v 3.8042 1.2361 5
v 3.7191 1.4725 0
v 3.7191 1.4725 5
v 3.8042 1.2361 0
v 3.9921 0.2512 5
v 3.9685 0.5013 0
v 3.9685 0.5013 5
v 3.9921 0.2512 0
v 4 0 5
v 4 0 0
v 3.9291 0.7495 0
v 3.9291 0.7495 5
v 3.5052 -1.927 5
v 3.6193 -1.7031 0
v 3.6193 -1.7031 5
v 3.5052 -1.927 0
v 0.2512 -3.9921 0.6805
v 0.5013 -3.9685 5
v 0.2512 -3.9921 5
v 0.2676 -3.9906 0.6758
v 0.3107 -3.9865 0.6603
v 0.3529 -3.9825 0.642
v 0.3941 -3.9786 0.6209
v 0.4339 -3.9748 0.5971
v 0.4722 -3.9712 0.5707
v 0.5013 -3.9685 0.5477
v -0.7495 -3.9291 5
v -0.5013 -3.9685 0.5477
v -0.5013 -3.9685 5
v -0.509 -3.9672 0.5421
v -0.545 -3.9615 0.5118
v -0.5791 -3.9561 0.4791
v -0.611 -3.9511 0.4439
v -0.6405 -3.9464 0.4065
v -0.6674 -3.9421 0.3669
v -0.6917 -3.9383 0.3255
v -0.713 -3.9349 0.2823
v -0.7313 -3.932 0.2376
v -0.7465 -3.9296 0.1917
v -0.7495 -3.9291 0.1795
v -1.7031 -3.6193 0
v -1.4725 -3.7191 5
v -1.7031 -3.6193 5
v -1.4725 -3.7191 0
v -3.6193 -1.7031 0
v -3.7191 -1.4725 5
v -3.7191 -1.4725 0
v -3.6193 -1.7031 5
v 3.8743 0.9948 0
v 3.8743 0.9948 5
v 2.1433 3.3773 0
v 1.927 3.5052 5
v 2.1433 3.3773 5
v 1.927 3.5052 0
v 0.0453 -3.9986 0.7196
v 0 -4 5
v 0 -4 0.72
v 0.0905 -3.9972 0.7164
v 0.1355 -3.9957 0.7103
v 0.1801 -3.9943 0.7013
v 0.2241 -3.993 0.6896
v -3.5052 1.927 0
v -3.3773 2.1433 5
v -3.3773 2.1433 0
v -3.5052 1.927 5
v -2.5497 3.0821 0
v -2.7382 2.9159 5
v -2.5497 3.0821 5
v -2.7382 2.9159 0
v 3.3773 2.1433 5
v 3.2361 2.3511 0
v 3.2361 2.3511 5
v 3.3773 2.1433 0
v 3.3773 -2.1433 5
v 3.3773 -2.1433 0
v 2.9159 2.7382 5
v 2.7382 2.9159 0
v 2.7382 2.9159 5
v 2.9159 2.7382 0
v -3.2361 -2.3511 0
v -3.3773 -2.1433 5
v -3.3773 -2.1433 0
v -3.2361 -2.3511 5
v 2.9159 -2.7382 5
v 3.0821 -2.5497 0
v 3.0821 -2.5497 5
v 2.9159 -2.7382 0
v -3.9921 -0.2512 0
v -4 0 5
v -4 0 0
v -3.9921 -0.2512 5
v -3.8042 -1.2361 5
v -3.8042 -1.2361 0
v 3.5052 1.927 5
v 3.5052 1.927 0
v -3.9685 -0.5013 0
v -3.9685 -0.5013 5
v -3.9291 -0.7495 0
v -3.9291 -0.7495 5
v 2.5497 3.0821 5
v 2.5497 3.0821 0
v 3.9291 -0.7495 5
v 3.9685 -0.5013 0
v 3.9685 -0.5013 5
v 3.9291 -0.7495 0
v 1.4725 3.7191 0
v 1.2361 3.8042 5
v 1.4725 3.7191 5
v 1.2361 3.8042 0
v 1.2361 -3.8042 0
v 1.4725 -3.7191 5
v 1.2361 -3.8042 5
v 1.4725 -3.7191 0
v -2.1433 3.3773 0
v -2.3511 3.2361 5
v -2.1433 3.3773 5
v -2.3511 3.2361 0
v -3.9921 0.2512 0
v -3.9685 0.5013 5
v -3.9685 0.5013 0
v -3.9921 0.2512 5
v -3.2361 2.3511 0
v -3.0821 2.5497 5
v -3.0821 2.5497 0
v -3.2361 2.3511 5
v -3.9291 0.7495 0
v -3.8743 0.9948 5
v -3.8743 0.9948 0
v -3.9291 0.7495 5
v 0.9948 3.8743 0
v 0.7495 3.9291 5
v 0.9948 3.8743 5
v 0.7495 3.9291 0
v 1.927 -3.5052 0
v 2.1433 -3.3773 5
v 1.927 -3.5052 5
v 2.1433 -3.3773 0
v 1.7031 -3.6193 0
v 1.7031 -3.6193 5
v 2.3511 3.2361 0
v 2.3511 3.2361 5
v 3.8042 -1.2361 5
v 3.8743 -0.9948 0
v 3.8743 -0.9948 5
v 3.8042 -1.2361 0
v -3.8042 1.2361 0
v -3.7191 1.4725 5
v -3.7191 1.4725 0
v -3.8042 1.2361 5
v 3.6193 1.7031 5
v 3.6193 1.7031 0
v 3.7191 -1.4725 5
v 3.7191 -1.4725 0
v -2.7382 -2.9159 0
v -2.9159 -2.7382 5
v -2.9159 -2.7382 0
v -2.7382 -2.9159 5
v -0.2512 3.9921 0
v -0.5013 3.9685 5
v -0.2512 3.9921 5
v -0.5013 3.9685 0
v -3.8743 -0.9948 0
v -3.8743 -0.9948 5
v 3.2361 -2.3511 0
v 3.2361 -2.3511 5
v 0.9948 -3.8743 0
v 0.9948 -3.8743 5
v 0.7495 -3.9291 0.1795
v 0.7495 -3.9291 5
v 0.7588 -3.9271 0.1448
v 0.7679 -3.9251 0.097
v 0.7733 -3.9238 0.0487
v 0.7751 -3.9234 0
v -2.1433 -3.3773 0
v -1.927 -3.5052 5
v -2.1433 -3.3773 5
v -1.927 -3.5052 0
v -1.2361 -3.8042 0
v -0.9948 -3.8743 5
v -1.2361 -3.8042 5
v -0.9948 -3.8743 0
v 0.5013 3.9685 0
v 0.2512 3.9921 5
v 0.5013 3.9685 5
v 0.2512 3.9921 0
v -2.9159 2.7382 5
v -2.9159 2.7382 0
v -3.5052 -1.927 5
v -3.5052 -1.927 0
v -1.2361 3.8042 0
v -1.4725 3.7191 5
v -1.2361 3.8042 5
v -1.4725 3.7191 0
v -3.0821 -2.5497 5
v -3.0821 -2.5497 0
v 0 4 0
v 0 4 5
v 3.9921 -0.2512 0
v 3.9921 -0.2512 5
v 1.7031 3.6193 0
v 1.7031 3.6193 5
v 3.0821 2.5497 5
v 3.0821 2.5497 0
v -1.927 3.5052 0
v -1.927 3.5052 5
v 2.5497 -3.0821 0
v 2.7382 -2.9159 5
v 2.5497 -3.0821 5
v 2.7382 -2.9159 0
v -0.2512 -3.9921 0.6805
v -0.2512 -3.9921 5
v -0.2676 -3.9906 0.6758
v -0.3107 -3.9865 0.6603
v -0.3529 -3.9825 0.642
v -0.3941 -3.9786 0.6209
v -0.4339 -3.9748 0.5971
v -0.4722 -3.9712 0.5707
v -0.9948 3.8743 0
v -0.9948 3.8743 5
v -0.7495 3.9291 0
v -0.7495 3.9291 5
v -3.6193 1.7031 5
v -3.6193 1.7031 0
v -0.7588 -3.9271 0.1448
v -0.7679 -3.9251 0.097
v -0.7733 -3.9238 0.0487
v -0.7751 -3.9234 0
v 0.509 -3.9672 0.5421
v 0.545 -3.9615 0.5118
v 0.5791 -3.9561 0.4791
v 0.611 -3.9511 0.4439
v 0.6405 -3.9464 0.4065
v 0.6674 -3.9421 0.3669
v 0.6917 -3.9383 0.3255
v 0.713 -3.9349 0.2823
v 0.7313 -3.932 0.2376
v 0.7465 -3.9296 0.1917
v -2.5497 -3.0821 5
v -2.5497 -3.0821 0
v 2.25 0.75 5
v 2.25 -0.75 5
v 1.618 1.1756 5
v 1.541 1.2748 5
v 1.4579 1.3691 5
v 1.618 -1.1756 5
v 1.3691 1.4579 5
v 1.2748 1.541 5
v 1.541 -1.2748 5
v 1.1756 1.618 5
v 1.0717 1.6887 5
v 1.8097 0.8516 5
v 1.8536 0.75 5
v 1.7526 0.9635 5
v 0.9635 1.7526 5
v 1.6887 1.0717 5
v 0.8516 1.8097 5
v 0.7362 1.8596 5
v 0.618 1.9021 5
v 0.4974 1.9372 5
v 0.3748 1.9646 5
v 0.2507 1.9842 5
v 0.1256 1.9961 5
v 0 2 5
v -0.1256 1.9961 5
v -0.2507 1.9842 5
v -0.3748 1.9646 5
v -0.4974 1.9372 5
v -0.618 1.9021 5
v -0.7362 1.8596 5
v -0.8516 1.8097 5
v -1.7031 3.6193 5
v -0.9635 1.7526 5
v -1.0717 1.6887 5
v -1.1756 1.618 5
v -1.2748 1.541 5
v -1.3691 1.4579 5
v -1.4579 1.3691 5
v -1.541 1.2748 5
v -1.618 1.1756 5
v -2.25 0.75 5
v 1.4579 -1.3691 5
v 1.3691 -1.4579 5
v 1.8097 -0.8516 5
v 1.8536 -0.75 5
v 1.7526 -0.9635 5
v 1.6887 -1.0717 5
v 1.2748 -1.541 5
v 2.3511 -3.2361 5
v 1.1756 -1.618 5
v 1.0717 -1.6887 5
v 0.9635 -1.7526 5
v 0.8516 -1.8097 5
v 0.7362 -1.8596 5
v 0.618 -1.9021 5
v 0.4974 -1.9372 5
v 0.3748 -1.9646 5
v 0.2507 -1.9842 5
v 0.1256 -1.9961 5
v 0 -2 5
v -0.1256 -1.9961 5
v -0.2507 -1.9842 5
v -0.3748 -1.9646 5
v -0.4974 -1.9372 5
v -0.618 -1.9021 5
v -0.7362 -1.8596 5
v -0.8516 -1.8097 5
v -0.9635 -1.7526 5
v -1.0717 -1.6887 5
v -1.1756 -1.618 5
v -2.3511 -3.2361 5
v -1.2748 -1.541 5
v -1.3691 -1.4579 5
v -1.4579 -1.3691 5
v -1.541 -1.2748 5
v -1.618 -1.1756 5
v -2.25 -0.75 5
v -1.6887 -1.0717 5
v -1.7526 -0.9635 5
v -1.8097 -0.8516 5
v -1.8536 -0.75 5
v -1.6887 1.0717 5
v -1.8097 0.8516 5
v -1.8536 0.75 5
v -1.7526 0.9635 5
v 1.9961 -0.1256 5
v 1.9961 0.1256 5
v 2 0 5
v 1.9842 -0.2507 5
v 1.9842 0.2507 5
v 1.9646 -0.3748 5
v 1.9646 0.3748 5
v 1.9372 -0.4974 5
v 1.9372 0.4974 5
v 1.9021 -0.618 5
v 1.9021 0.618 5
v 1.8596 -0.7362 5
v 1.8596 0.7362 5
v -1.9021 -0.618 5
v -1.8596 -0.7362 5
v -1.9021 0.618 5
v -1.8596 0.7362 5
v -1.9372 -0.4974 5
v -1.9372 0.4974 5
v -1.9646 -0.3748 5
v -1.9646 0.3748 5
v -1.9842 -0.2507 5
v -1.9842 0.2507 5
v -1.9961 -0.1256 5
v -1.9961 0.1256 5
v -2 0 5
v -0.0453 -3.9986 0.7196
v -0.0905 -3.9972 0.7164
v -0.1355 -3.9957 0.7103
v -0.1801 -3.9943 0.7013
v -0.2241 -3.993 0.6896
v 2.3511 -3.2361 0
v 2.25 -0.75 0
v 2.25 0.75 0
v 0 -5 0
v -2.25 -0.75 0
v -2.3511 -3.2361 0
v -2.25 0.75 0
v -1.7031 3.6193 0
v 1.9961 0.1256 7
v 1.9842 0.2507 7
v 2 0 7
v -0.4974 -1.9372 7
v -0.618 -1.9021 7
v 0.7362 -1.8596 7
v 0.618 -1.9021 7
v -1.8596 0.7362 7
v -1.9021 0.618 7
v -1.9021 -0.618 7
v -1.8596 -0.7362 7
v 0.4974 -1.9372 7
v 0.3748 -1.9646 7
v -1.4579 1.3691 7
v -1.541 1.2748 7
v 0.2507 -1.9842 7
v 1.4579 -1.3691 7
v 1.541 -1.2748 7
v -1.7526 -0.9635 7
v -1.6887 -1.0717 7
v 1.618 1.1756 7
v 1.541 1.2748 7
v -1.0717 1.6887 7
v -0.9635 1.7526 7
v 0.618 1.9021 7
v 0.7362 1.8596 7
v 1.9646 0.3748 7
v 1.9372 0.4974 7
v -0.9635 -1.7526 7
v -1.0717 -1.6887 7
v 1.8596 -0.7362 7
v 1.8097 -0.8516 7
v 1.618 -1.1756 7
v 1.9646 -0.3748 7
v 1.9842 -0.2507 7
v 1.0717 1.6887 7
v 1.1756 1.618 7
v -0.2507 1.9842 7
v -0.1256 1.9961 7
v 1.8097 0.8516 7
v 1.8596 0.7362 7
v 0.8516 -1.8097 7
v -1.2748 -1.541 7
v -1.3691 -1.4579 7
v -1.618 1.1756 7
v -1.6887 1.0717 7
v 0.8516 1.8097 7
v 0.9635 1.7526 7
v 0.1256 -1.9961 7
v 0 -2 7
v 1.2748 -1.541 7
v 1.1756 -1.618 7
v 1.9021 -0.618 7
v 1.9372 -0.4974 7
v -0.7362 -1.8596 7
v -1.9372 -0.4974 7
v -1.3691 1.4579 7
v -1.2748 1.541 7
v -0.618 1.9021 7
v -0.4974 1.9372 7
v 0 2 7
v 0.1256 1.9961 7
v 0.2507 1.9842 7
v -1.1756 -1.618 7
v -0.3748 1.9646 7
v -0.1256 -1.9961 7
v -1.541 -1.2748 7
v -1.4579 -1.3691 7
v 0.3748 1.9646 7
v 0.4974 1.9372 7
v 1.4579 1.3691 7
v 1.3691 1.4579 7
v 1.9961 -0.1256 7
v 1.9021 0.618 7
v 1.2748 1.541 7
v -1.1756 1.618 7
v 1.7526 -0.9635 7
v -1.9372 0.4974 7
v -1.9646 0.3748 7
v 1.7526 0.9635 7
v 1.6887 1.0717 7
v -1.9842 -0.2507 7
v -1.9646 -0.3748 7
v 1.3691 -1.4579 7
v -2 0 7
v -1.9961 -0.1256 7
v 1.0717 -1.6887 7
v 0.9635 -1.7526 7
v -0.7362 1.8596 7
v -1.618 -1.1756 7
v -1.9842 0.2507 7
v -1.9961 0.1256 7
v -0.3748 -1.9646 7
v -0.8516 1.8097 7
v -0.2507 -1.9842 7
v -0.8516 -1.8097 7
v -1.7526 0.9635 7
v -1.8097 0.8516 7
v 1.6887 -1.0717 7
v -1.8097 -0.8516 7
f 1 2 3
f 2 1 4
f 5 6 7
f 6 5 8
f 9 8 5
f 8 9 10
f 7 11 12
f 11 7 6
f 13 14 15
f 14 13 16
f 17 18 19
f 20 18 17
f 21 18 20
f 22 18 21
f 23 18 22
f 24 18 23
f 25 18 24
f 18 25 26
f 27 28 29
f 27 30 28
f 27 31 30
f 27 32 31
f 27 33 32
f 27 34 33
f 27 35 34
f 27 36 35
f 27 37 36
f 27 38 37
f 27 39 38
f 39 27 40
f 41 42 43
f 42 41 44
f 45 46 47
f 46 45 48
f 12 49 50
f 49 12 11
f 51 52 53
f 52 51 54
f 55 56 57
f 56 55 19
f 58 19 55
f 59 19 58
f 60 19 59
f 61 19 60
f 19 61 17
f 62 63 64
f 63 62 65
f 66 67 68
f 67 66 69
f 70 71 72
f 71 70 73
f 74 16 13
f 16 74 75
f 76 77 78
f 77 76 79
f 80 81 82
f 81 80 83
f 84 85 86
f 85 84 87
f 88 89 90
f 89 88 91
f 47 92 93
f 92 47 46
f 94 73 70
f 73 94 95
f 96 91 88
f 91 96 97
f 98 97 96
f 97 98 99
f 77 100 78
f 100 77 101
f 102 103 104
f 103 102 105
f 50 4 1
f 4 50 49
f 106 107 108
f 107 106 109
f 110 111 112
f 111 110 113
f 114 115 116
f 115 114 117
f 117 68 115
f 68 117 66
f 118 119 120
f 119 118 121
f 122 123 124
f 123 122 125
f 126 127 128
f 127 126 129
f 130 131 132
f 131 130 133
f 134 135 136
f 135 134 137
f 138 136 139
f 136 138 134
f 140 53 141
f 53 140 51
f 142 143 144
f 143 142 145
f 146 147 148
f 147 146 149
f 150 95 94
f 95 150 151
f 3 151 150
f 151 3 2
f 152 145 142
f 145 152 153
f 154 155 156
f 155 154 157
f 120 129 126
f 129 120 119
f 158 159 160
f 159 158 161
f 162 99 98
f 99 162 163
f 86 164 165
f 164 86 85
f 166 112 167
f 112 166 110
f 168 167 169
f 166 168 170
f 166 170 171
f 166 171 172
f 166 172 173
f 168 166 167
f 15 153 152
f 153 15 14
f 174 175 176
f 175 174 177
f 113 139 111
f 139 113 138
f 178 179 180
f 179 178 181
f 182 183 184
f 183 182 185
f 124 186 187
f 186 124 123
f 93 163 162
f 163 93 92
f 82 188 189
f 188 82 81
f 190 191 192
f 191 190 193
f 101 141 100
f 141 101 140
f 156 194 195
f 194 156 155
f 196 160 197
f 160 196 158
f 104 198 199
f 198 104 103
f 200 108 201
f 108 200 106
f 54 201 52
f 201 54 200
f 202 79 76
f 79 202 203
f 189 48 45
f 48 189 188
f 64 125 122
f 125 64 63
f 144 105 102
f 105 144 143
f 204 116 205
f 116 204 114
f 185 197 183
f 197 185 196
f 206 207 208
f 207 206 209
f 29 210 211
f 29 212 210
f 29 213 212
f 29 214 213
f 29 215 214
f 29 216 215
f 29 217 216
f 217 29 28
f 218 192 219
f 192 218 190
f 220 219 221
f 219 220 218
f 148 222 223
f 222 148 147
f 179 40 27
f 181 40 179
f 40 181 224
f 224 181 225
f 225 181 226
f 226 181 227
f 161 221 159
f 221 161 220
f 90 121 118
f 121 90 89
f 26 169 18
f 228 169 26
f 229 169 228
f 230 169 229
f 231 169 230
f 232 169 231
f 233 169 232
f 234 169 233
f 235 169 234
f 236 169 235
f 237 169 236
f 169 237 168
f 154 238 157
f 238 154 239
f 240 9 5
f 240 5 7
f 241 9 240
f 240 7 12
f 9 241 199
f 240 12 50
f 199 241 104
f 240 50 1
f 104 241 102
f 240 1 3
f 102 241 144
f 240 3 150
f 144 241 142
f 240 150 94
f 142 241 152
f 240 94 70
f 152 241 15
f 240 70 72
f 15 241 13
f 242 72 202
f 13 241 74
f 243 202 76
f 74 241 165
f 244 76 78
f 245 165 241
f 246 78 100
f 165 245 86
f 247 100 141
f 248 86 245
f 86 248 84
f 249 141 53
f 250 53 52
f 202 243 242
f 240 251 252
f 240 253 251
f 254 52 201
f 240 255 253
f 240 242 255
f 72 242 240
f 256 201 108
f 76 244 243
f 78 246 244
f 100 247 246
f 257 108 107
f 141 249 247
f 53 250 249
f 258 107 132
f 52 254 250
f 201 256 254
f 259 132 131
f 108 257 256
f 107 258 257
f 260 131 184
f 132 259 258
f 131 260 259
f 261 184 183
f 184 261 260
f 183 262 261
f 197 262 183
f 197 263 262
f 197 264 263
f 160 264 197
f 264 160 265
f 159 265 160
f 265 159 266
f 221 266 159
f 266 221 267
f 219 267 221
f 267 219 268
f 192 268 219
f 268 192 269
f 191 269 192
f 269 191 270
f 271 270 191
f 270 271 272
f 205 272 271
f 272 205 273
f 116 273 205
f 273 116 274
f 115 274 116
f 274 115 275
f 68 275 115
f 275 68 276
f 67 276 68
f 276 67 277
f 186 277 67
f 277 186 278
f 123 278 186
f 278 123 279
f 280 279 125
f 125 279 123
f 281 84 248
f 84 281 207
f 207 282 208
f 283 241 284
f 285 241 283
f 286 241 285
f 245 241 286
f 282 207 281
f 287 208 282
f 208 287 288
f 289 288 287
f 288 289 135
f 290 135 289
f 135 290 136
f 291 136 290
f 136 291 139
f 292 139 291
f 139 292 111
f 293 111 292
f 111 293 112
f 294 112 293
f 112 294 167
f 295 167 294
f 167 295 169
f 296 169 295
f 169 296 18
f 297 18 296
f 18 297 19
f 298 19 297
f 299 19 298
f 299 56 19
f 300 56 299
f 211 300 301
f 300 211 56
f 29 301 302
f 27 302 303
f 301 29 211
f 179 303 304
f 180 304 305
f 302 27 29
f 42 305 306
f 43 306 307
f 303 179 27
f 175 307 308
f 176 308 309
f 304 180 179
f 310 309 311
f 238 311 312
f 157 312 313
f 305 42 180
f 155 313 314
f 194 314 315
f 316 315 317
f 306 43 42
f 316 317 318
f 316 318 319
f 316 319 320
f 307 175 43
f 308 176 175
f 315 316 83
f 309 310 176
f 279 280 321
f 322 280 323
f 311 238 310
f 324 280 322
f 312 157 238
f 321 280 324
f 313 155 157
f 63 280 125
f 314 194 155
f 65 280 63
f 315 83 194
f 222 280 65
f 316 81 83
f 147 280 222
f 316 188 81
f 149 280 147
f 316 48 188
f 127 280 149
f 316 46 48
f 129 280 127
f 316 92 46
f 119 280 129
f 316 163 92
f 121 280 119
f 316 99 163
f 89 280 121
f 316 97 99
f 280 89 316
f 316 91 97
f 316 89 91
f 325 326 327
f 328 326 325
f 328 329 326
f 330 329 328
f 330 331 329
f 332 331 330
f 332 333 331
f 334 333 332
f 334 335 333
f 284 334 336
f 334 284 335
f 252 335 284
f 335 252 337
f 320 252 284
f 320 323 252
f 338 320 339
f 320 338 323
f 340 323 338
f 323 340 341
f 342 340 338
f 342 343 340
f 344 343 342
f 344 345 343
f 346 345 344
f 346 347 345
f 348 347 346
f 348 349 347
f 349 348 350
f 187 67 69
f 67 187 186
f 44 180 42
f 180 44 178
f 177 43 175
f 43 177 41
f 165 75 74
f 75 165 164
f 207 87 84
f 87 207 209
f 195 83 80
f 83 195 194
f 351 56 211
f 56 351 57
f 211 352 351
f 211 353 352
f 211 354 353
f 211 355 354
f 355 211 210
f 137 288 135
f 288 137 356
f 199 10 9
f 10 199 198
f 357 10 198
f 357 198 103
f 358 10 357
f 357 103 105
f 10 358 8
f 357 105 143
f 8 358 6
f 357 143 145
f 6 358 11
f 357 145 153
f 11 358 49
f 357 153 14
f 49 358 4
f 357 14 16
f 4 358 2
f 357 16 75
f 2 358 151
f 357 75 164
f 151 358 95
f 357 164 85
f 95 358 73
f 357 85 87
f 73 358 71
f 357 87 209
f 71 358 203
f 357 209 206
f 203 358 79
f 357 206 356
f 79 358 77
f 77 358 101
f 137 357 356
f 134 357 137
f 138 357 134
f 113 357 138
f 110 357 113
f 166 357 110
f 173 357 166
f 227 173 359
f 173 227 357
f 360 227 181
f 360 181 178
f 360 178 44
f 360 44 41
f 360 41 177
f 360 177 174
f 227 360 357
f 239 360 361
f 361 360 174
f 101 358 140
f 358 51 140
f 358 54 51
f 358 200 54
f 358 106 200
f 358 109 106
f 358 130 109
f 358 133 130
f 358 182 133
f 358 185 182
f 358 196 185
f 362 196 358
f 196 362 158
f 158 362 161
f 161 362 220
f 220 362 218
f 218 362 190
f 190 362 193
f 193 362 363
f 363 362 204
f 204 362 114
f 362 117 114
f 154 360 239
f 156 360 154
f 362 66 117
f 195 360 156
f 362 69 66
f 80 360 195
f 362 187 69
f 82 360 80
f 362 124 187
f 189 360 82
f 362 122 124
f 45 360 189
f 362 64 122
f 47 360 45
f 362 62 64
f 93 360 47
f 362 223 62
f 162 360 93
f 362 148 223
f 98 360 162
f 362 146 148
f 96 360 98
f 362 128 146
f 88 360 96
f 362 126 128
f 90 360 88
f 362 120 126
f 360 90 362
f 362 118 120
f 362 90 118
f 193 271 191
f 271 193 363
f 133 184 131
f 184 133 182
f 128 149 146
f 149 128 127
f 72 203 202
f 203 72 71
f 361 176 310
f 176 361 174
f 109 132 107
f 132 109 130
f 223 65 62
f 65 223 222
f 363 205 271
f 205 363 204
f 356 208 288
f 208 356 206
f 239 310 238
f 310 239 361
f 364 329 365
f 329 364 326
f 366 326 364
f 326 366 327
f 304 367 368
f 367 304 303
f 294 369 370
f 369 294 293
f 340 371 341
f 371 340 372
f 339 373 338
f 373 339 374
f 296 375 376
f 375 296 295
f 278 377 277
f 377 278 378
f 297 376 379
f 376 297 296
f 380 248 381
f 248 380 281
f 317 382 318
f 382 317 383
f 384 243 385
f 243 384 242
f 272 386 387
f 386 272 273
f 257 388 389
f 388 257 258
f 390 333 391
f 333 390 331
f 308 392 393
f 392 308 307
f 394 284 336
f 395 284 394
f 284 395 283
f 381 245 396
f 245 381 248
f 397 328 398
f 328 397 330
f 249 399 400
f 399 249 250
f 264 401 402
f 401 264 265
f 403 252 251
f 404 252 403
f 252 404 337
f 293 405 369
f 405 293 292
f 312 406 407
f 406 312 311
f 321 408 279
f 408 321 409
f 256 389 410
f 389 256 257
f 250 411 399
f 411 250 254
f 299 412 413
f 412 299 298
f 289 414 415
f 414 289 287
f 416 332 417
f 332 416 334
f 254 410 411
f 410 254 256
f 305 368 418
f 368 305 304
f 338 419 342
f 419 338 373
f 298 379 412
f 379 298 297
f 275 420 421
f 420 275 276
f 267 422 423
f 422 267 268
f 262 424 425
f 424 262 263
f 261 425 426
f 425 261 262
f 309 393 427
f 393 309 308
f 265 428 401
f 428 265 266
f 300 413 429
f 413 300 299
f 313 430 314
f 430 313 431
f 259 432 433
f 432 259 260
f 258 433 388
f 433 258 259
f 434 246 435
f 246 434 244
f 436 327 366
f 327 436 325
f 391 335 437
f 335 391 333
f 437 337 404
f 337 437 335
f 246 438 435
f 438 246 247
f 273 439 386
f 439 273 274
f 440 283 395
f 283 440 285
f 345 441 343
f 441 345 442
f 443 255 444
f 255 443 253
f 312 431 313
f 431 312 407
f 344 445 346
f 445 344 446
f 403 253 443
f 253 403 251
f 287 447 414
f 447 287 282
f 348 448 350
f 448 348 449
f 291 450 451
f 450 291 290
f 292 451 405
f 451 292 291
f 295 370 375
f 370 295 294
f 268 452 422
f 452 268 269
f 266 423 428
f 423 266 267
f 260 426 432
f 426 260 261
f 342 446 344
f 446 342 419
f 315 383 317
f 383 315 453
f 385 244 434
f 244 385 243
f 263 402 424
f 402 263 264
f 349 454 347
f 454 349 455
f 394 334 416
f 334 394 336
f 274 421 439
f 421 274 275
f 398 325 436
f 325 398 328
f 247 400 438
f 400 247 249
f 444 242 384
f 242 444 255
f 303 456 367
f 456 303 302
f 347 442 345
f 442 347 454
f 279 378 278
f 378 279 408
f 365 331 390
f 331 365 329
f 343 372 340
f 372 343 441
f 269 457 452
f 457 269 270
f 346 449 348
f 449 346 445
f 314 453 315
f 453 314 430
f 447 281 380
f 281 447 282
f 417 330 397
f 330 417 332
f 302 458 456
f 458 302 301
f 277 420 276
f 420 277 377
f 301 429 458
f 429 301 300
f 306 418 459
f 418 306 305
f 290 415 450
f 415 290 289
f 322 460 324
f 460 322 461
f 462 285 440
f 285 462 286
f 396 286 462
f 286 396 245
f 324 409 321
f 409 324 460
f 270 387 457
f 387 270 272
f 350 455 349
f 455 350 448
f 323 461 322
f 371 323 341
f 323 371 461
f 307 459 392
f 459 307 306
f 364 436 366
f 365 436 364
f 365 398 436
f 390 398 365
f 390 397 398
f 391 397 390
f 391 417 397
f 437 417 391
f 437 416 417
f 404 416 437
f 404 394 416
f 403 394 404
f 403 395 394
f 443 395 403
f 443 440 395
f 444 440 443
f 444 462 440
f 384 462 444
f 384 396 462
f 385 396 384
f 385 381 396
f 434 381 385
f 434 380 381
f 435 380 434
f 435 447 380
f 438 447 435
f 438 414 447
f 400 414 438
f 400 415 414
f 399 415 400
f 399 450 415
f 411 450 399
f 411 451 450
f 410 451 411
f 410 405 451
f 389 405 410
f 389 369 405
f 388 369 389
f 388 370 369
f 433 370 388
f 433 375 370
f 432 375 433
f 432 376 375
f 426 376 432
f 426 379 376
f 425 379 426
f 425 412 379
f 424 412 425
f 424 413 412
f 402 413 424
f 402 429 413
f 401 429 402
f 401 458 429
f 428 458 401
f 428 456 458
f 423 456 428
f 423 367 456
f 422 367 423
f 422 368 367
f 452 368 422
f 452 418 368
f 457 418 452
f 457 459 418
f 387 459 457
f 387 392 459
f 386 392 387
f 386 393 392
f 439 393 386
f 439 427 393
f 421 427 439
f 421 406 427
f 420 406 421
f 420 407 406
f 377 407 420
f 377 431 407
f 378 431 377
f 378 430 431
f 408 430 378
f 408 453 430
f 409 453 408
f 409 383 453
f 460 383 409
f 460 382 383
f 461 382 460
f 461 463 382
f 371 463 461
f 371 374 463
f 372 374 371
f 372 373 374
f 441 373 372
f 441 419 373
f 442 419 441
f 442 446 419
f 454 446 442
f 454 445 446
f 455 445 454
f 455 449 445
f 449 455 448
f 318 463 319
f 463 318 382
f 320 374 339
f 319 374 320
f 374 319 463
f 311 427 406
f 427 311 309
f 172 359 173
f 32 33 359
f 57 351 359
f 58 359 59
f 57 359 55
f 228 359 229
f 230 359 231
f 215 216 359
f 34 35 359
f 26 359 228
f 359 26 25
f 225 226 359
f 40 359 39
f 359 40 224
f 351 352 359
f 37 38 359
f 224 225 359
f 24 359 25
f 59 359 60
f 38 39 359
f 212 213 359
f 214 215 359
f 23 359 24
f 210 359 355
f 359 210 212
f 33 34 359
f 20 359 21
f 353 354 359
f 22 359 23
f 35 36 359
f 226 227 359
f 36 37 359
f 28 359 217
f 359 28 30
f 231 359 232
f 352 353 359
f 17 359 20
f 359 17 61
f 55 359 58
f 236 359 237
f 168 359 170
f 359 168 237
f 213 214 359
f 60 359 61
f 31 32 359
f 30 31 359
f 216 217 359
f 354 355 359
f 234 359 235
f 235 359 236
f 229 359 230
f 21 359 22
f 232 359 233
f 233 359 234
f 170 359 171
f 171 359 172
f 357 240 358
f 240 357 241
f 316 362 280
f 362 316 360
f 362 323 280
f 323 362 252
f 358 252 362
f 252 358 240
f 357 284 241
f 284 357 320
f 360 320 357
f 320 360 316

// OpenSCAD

//Which support would you like to use
Support = "Rectangle"; //[Rectangle,Cylinder,NONE]

// if rectangular, width of the support
rect_support_x = 4.5; 
// if rectangular, height of support
rect_support_y = 1.5; 
// if rectangular, depth of the support
rect_support_z = 5; 

//if cylinder, depth of  support
cyl_support_h = 4; 
//if cylinder, diameter of cylinder support
cyl_support_d = 3; 


// button size
// radius of the button
button_radius = 4; 
// height of the button
button_height = 7; 
// radius of rounded corner
button_angle_radius = 2; 
//to not have the marker, let 0.
marker_size = 1; 


/* [hidden] */

// ignore variable values
$fn=100;

difference(){
    union(){
        cylinder(h = button_height - button_angle_radius, r = button_radius, center = false); 
        cylinder(h = button_height , r = button_radius - button_angle_radius, center = false);
        translate([0,0,button_height - button_angle_radius])
            rotate_extrude(convexity = 10)
                translate([2, 0, 0])
                    circle(r = button_angle_radius);
    if( marker_size > 0){
        translate([0,0,0])
            rotate(a = 90, v = ([1,0,0])){
                cylinder(h = marker_size + button_radius, r1 = button_radius * 0.9, r2 = 0);
            }; 
        }  
    }
    union(){
        translate([0,0,0- 2*(marker_size+button_radius)]) cube((marker_size+button_radius) * 4, center=true); 
        if (Support == "Rectangle"){
            translate([-rect_support_x / 2,-rect_support_y /2,0]) cube([rect_support_x, rect_support_y, rect_support_z], center= false);
        }
        if (Support == "Cylinder"){
            translate([0,0,0]) cylinder(h = cyl_support_h, r = cyl_support_d / 2, center= false);
        }
    }
}
